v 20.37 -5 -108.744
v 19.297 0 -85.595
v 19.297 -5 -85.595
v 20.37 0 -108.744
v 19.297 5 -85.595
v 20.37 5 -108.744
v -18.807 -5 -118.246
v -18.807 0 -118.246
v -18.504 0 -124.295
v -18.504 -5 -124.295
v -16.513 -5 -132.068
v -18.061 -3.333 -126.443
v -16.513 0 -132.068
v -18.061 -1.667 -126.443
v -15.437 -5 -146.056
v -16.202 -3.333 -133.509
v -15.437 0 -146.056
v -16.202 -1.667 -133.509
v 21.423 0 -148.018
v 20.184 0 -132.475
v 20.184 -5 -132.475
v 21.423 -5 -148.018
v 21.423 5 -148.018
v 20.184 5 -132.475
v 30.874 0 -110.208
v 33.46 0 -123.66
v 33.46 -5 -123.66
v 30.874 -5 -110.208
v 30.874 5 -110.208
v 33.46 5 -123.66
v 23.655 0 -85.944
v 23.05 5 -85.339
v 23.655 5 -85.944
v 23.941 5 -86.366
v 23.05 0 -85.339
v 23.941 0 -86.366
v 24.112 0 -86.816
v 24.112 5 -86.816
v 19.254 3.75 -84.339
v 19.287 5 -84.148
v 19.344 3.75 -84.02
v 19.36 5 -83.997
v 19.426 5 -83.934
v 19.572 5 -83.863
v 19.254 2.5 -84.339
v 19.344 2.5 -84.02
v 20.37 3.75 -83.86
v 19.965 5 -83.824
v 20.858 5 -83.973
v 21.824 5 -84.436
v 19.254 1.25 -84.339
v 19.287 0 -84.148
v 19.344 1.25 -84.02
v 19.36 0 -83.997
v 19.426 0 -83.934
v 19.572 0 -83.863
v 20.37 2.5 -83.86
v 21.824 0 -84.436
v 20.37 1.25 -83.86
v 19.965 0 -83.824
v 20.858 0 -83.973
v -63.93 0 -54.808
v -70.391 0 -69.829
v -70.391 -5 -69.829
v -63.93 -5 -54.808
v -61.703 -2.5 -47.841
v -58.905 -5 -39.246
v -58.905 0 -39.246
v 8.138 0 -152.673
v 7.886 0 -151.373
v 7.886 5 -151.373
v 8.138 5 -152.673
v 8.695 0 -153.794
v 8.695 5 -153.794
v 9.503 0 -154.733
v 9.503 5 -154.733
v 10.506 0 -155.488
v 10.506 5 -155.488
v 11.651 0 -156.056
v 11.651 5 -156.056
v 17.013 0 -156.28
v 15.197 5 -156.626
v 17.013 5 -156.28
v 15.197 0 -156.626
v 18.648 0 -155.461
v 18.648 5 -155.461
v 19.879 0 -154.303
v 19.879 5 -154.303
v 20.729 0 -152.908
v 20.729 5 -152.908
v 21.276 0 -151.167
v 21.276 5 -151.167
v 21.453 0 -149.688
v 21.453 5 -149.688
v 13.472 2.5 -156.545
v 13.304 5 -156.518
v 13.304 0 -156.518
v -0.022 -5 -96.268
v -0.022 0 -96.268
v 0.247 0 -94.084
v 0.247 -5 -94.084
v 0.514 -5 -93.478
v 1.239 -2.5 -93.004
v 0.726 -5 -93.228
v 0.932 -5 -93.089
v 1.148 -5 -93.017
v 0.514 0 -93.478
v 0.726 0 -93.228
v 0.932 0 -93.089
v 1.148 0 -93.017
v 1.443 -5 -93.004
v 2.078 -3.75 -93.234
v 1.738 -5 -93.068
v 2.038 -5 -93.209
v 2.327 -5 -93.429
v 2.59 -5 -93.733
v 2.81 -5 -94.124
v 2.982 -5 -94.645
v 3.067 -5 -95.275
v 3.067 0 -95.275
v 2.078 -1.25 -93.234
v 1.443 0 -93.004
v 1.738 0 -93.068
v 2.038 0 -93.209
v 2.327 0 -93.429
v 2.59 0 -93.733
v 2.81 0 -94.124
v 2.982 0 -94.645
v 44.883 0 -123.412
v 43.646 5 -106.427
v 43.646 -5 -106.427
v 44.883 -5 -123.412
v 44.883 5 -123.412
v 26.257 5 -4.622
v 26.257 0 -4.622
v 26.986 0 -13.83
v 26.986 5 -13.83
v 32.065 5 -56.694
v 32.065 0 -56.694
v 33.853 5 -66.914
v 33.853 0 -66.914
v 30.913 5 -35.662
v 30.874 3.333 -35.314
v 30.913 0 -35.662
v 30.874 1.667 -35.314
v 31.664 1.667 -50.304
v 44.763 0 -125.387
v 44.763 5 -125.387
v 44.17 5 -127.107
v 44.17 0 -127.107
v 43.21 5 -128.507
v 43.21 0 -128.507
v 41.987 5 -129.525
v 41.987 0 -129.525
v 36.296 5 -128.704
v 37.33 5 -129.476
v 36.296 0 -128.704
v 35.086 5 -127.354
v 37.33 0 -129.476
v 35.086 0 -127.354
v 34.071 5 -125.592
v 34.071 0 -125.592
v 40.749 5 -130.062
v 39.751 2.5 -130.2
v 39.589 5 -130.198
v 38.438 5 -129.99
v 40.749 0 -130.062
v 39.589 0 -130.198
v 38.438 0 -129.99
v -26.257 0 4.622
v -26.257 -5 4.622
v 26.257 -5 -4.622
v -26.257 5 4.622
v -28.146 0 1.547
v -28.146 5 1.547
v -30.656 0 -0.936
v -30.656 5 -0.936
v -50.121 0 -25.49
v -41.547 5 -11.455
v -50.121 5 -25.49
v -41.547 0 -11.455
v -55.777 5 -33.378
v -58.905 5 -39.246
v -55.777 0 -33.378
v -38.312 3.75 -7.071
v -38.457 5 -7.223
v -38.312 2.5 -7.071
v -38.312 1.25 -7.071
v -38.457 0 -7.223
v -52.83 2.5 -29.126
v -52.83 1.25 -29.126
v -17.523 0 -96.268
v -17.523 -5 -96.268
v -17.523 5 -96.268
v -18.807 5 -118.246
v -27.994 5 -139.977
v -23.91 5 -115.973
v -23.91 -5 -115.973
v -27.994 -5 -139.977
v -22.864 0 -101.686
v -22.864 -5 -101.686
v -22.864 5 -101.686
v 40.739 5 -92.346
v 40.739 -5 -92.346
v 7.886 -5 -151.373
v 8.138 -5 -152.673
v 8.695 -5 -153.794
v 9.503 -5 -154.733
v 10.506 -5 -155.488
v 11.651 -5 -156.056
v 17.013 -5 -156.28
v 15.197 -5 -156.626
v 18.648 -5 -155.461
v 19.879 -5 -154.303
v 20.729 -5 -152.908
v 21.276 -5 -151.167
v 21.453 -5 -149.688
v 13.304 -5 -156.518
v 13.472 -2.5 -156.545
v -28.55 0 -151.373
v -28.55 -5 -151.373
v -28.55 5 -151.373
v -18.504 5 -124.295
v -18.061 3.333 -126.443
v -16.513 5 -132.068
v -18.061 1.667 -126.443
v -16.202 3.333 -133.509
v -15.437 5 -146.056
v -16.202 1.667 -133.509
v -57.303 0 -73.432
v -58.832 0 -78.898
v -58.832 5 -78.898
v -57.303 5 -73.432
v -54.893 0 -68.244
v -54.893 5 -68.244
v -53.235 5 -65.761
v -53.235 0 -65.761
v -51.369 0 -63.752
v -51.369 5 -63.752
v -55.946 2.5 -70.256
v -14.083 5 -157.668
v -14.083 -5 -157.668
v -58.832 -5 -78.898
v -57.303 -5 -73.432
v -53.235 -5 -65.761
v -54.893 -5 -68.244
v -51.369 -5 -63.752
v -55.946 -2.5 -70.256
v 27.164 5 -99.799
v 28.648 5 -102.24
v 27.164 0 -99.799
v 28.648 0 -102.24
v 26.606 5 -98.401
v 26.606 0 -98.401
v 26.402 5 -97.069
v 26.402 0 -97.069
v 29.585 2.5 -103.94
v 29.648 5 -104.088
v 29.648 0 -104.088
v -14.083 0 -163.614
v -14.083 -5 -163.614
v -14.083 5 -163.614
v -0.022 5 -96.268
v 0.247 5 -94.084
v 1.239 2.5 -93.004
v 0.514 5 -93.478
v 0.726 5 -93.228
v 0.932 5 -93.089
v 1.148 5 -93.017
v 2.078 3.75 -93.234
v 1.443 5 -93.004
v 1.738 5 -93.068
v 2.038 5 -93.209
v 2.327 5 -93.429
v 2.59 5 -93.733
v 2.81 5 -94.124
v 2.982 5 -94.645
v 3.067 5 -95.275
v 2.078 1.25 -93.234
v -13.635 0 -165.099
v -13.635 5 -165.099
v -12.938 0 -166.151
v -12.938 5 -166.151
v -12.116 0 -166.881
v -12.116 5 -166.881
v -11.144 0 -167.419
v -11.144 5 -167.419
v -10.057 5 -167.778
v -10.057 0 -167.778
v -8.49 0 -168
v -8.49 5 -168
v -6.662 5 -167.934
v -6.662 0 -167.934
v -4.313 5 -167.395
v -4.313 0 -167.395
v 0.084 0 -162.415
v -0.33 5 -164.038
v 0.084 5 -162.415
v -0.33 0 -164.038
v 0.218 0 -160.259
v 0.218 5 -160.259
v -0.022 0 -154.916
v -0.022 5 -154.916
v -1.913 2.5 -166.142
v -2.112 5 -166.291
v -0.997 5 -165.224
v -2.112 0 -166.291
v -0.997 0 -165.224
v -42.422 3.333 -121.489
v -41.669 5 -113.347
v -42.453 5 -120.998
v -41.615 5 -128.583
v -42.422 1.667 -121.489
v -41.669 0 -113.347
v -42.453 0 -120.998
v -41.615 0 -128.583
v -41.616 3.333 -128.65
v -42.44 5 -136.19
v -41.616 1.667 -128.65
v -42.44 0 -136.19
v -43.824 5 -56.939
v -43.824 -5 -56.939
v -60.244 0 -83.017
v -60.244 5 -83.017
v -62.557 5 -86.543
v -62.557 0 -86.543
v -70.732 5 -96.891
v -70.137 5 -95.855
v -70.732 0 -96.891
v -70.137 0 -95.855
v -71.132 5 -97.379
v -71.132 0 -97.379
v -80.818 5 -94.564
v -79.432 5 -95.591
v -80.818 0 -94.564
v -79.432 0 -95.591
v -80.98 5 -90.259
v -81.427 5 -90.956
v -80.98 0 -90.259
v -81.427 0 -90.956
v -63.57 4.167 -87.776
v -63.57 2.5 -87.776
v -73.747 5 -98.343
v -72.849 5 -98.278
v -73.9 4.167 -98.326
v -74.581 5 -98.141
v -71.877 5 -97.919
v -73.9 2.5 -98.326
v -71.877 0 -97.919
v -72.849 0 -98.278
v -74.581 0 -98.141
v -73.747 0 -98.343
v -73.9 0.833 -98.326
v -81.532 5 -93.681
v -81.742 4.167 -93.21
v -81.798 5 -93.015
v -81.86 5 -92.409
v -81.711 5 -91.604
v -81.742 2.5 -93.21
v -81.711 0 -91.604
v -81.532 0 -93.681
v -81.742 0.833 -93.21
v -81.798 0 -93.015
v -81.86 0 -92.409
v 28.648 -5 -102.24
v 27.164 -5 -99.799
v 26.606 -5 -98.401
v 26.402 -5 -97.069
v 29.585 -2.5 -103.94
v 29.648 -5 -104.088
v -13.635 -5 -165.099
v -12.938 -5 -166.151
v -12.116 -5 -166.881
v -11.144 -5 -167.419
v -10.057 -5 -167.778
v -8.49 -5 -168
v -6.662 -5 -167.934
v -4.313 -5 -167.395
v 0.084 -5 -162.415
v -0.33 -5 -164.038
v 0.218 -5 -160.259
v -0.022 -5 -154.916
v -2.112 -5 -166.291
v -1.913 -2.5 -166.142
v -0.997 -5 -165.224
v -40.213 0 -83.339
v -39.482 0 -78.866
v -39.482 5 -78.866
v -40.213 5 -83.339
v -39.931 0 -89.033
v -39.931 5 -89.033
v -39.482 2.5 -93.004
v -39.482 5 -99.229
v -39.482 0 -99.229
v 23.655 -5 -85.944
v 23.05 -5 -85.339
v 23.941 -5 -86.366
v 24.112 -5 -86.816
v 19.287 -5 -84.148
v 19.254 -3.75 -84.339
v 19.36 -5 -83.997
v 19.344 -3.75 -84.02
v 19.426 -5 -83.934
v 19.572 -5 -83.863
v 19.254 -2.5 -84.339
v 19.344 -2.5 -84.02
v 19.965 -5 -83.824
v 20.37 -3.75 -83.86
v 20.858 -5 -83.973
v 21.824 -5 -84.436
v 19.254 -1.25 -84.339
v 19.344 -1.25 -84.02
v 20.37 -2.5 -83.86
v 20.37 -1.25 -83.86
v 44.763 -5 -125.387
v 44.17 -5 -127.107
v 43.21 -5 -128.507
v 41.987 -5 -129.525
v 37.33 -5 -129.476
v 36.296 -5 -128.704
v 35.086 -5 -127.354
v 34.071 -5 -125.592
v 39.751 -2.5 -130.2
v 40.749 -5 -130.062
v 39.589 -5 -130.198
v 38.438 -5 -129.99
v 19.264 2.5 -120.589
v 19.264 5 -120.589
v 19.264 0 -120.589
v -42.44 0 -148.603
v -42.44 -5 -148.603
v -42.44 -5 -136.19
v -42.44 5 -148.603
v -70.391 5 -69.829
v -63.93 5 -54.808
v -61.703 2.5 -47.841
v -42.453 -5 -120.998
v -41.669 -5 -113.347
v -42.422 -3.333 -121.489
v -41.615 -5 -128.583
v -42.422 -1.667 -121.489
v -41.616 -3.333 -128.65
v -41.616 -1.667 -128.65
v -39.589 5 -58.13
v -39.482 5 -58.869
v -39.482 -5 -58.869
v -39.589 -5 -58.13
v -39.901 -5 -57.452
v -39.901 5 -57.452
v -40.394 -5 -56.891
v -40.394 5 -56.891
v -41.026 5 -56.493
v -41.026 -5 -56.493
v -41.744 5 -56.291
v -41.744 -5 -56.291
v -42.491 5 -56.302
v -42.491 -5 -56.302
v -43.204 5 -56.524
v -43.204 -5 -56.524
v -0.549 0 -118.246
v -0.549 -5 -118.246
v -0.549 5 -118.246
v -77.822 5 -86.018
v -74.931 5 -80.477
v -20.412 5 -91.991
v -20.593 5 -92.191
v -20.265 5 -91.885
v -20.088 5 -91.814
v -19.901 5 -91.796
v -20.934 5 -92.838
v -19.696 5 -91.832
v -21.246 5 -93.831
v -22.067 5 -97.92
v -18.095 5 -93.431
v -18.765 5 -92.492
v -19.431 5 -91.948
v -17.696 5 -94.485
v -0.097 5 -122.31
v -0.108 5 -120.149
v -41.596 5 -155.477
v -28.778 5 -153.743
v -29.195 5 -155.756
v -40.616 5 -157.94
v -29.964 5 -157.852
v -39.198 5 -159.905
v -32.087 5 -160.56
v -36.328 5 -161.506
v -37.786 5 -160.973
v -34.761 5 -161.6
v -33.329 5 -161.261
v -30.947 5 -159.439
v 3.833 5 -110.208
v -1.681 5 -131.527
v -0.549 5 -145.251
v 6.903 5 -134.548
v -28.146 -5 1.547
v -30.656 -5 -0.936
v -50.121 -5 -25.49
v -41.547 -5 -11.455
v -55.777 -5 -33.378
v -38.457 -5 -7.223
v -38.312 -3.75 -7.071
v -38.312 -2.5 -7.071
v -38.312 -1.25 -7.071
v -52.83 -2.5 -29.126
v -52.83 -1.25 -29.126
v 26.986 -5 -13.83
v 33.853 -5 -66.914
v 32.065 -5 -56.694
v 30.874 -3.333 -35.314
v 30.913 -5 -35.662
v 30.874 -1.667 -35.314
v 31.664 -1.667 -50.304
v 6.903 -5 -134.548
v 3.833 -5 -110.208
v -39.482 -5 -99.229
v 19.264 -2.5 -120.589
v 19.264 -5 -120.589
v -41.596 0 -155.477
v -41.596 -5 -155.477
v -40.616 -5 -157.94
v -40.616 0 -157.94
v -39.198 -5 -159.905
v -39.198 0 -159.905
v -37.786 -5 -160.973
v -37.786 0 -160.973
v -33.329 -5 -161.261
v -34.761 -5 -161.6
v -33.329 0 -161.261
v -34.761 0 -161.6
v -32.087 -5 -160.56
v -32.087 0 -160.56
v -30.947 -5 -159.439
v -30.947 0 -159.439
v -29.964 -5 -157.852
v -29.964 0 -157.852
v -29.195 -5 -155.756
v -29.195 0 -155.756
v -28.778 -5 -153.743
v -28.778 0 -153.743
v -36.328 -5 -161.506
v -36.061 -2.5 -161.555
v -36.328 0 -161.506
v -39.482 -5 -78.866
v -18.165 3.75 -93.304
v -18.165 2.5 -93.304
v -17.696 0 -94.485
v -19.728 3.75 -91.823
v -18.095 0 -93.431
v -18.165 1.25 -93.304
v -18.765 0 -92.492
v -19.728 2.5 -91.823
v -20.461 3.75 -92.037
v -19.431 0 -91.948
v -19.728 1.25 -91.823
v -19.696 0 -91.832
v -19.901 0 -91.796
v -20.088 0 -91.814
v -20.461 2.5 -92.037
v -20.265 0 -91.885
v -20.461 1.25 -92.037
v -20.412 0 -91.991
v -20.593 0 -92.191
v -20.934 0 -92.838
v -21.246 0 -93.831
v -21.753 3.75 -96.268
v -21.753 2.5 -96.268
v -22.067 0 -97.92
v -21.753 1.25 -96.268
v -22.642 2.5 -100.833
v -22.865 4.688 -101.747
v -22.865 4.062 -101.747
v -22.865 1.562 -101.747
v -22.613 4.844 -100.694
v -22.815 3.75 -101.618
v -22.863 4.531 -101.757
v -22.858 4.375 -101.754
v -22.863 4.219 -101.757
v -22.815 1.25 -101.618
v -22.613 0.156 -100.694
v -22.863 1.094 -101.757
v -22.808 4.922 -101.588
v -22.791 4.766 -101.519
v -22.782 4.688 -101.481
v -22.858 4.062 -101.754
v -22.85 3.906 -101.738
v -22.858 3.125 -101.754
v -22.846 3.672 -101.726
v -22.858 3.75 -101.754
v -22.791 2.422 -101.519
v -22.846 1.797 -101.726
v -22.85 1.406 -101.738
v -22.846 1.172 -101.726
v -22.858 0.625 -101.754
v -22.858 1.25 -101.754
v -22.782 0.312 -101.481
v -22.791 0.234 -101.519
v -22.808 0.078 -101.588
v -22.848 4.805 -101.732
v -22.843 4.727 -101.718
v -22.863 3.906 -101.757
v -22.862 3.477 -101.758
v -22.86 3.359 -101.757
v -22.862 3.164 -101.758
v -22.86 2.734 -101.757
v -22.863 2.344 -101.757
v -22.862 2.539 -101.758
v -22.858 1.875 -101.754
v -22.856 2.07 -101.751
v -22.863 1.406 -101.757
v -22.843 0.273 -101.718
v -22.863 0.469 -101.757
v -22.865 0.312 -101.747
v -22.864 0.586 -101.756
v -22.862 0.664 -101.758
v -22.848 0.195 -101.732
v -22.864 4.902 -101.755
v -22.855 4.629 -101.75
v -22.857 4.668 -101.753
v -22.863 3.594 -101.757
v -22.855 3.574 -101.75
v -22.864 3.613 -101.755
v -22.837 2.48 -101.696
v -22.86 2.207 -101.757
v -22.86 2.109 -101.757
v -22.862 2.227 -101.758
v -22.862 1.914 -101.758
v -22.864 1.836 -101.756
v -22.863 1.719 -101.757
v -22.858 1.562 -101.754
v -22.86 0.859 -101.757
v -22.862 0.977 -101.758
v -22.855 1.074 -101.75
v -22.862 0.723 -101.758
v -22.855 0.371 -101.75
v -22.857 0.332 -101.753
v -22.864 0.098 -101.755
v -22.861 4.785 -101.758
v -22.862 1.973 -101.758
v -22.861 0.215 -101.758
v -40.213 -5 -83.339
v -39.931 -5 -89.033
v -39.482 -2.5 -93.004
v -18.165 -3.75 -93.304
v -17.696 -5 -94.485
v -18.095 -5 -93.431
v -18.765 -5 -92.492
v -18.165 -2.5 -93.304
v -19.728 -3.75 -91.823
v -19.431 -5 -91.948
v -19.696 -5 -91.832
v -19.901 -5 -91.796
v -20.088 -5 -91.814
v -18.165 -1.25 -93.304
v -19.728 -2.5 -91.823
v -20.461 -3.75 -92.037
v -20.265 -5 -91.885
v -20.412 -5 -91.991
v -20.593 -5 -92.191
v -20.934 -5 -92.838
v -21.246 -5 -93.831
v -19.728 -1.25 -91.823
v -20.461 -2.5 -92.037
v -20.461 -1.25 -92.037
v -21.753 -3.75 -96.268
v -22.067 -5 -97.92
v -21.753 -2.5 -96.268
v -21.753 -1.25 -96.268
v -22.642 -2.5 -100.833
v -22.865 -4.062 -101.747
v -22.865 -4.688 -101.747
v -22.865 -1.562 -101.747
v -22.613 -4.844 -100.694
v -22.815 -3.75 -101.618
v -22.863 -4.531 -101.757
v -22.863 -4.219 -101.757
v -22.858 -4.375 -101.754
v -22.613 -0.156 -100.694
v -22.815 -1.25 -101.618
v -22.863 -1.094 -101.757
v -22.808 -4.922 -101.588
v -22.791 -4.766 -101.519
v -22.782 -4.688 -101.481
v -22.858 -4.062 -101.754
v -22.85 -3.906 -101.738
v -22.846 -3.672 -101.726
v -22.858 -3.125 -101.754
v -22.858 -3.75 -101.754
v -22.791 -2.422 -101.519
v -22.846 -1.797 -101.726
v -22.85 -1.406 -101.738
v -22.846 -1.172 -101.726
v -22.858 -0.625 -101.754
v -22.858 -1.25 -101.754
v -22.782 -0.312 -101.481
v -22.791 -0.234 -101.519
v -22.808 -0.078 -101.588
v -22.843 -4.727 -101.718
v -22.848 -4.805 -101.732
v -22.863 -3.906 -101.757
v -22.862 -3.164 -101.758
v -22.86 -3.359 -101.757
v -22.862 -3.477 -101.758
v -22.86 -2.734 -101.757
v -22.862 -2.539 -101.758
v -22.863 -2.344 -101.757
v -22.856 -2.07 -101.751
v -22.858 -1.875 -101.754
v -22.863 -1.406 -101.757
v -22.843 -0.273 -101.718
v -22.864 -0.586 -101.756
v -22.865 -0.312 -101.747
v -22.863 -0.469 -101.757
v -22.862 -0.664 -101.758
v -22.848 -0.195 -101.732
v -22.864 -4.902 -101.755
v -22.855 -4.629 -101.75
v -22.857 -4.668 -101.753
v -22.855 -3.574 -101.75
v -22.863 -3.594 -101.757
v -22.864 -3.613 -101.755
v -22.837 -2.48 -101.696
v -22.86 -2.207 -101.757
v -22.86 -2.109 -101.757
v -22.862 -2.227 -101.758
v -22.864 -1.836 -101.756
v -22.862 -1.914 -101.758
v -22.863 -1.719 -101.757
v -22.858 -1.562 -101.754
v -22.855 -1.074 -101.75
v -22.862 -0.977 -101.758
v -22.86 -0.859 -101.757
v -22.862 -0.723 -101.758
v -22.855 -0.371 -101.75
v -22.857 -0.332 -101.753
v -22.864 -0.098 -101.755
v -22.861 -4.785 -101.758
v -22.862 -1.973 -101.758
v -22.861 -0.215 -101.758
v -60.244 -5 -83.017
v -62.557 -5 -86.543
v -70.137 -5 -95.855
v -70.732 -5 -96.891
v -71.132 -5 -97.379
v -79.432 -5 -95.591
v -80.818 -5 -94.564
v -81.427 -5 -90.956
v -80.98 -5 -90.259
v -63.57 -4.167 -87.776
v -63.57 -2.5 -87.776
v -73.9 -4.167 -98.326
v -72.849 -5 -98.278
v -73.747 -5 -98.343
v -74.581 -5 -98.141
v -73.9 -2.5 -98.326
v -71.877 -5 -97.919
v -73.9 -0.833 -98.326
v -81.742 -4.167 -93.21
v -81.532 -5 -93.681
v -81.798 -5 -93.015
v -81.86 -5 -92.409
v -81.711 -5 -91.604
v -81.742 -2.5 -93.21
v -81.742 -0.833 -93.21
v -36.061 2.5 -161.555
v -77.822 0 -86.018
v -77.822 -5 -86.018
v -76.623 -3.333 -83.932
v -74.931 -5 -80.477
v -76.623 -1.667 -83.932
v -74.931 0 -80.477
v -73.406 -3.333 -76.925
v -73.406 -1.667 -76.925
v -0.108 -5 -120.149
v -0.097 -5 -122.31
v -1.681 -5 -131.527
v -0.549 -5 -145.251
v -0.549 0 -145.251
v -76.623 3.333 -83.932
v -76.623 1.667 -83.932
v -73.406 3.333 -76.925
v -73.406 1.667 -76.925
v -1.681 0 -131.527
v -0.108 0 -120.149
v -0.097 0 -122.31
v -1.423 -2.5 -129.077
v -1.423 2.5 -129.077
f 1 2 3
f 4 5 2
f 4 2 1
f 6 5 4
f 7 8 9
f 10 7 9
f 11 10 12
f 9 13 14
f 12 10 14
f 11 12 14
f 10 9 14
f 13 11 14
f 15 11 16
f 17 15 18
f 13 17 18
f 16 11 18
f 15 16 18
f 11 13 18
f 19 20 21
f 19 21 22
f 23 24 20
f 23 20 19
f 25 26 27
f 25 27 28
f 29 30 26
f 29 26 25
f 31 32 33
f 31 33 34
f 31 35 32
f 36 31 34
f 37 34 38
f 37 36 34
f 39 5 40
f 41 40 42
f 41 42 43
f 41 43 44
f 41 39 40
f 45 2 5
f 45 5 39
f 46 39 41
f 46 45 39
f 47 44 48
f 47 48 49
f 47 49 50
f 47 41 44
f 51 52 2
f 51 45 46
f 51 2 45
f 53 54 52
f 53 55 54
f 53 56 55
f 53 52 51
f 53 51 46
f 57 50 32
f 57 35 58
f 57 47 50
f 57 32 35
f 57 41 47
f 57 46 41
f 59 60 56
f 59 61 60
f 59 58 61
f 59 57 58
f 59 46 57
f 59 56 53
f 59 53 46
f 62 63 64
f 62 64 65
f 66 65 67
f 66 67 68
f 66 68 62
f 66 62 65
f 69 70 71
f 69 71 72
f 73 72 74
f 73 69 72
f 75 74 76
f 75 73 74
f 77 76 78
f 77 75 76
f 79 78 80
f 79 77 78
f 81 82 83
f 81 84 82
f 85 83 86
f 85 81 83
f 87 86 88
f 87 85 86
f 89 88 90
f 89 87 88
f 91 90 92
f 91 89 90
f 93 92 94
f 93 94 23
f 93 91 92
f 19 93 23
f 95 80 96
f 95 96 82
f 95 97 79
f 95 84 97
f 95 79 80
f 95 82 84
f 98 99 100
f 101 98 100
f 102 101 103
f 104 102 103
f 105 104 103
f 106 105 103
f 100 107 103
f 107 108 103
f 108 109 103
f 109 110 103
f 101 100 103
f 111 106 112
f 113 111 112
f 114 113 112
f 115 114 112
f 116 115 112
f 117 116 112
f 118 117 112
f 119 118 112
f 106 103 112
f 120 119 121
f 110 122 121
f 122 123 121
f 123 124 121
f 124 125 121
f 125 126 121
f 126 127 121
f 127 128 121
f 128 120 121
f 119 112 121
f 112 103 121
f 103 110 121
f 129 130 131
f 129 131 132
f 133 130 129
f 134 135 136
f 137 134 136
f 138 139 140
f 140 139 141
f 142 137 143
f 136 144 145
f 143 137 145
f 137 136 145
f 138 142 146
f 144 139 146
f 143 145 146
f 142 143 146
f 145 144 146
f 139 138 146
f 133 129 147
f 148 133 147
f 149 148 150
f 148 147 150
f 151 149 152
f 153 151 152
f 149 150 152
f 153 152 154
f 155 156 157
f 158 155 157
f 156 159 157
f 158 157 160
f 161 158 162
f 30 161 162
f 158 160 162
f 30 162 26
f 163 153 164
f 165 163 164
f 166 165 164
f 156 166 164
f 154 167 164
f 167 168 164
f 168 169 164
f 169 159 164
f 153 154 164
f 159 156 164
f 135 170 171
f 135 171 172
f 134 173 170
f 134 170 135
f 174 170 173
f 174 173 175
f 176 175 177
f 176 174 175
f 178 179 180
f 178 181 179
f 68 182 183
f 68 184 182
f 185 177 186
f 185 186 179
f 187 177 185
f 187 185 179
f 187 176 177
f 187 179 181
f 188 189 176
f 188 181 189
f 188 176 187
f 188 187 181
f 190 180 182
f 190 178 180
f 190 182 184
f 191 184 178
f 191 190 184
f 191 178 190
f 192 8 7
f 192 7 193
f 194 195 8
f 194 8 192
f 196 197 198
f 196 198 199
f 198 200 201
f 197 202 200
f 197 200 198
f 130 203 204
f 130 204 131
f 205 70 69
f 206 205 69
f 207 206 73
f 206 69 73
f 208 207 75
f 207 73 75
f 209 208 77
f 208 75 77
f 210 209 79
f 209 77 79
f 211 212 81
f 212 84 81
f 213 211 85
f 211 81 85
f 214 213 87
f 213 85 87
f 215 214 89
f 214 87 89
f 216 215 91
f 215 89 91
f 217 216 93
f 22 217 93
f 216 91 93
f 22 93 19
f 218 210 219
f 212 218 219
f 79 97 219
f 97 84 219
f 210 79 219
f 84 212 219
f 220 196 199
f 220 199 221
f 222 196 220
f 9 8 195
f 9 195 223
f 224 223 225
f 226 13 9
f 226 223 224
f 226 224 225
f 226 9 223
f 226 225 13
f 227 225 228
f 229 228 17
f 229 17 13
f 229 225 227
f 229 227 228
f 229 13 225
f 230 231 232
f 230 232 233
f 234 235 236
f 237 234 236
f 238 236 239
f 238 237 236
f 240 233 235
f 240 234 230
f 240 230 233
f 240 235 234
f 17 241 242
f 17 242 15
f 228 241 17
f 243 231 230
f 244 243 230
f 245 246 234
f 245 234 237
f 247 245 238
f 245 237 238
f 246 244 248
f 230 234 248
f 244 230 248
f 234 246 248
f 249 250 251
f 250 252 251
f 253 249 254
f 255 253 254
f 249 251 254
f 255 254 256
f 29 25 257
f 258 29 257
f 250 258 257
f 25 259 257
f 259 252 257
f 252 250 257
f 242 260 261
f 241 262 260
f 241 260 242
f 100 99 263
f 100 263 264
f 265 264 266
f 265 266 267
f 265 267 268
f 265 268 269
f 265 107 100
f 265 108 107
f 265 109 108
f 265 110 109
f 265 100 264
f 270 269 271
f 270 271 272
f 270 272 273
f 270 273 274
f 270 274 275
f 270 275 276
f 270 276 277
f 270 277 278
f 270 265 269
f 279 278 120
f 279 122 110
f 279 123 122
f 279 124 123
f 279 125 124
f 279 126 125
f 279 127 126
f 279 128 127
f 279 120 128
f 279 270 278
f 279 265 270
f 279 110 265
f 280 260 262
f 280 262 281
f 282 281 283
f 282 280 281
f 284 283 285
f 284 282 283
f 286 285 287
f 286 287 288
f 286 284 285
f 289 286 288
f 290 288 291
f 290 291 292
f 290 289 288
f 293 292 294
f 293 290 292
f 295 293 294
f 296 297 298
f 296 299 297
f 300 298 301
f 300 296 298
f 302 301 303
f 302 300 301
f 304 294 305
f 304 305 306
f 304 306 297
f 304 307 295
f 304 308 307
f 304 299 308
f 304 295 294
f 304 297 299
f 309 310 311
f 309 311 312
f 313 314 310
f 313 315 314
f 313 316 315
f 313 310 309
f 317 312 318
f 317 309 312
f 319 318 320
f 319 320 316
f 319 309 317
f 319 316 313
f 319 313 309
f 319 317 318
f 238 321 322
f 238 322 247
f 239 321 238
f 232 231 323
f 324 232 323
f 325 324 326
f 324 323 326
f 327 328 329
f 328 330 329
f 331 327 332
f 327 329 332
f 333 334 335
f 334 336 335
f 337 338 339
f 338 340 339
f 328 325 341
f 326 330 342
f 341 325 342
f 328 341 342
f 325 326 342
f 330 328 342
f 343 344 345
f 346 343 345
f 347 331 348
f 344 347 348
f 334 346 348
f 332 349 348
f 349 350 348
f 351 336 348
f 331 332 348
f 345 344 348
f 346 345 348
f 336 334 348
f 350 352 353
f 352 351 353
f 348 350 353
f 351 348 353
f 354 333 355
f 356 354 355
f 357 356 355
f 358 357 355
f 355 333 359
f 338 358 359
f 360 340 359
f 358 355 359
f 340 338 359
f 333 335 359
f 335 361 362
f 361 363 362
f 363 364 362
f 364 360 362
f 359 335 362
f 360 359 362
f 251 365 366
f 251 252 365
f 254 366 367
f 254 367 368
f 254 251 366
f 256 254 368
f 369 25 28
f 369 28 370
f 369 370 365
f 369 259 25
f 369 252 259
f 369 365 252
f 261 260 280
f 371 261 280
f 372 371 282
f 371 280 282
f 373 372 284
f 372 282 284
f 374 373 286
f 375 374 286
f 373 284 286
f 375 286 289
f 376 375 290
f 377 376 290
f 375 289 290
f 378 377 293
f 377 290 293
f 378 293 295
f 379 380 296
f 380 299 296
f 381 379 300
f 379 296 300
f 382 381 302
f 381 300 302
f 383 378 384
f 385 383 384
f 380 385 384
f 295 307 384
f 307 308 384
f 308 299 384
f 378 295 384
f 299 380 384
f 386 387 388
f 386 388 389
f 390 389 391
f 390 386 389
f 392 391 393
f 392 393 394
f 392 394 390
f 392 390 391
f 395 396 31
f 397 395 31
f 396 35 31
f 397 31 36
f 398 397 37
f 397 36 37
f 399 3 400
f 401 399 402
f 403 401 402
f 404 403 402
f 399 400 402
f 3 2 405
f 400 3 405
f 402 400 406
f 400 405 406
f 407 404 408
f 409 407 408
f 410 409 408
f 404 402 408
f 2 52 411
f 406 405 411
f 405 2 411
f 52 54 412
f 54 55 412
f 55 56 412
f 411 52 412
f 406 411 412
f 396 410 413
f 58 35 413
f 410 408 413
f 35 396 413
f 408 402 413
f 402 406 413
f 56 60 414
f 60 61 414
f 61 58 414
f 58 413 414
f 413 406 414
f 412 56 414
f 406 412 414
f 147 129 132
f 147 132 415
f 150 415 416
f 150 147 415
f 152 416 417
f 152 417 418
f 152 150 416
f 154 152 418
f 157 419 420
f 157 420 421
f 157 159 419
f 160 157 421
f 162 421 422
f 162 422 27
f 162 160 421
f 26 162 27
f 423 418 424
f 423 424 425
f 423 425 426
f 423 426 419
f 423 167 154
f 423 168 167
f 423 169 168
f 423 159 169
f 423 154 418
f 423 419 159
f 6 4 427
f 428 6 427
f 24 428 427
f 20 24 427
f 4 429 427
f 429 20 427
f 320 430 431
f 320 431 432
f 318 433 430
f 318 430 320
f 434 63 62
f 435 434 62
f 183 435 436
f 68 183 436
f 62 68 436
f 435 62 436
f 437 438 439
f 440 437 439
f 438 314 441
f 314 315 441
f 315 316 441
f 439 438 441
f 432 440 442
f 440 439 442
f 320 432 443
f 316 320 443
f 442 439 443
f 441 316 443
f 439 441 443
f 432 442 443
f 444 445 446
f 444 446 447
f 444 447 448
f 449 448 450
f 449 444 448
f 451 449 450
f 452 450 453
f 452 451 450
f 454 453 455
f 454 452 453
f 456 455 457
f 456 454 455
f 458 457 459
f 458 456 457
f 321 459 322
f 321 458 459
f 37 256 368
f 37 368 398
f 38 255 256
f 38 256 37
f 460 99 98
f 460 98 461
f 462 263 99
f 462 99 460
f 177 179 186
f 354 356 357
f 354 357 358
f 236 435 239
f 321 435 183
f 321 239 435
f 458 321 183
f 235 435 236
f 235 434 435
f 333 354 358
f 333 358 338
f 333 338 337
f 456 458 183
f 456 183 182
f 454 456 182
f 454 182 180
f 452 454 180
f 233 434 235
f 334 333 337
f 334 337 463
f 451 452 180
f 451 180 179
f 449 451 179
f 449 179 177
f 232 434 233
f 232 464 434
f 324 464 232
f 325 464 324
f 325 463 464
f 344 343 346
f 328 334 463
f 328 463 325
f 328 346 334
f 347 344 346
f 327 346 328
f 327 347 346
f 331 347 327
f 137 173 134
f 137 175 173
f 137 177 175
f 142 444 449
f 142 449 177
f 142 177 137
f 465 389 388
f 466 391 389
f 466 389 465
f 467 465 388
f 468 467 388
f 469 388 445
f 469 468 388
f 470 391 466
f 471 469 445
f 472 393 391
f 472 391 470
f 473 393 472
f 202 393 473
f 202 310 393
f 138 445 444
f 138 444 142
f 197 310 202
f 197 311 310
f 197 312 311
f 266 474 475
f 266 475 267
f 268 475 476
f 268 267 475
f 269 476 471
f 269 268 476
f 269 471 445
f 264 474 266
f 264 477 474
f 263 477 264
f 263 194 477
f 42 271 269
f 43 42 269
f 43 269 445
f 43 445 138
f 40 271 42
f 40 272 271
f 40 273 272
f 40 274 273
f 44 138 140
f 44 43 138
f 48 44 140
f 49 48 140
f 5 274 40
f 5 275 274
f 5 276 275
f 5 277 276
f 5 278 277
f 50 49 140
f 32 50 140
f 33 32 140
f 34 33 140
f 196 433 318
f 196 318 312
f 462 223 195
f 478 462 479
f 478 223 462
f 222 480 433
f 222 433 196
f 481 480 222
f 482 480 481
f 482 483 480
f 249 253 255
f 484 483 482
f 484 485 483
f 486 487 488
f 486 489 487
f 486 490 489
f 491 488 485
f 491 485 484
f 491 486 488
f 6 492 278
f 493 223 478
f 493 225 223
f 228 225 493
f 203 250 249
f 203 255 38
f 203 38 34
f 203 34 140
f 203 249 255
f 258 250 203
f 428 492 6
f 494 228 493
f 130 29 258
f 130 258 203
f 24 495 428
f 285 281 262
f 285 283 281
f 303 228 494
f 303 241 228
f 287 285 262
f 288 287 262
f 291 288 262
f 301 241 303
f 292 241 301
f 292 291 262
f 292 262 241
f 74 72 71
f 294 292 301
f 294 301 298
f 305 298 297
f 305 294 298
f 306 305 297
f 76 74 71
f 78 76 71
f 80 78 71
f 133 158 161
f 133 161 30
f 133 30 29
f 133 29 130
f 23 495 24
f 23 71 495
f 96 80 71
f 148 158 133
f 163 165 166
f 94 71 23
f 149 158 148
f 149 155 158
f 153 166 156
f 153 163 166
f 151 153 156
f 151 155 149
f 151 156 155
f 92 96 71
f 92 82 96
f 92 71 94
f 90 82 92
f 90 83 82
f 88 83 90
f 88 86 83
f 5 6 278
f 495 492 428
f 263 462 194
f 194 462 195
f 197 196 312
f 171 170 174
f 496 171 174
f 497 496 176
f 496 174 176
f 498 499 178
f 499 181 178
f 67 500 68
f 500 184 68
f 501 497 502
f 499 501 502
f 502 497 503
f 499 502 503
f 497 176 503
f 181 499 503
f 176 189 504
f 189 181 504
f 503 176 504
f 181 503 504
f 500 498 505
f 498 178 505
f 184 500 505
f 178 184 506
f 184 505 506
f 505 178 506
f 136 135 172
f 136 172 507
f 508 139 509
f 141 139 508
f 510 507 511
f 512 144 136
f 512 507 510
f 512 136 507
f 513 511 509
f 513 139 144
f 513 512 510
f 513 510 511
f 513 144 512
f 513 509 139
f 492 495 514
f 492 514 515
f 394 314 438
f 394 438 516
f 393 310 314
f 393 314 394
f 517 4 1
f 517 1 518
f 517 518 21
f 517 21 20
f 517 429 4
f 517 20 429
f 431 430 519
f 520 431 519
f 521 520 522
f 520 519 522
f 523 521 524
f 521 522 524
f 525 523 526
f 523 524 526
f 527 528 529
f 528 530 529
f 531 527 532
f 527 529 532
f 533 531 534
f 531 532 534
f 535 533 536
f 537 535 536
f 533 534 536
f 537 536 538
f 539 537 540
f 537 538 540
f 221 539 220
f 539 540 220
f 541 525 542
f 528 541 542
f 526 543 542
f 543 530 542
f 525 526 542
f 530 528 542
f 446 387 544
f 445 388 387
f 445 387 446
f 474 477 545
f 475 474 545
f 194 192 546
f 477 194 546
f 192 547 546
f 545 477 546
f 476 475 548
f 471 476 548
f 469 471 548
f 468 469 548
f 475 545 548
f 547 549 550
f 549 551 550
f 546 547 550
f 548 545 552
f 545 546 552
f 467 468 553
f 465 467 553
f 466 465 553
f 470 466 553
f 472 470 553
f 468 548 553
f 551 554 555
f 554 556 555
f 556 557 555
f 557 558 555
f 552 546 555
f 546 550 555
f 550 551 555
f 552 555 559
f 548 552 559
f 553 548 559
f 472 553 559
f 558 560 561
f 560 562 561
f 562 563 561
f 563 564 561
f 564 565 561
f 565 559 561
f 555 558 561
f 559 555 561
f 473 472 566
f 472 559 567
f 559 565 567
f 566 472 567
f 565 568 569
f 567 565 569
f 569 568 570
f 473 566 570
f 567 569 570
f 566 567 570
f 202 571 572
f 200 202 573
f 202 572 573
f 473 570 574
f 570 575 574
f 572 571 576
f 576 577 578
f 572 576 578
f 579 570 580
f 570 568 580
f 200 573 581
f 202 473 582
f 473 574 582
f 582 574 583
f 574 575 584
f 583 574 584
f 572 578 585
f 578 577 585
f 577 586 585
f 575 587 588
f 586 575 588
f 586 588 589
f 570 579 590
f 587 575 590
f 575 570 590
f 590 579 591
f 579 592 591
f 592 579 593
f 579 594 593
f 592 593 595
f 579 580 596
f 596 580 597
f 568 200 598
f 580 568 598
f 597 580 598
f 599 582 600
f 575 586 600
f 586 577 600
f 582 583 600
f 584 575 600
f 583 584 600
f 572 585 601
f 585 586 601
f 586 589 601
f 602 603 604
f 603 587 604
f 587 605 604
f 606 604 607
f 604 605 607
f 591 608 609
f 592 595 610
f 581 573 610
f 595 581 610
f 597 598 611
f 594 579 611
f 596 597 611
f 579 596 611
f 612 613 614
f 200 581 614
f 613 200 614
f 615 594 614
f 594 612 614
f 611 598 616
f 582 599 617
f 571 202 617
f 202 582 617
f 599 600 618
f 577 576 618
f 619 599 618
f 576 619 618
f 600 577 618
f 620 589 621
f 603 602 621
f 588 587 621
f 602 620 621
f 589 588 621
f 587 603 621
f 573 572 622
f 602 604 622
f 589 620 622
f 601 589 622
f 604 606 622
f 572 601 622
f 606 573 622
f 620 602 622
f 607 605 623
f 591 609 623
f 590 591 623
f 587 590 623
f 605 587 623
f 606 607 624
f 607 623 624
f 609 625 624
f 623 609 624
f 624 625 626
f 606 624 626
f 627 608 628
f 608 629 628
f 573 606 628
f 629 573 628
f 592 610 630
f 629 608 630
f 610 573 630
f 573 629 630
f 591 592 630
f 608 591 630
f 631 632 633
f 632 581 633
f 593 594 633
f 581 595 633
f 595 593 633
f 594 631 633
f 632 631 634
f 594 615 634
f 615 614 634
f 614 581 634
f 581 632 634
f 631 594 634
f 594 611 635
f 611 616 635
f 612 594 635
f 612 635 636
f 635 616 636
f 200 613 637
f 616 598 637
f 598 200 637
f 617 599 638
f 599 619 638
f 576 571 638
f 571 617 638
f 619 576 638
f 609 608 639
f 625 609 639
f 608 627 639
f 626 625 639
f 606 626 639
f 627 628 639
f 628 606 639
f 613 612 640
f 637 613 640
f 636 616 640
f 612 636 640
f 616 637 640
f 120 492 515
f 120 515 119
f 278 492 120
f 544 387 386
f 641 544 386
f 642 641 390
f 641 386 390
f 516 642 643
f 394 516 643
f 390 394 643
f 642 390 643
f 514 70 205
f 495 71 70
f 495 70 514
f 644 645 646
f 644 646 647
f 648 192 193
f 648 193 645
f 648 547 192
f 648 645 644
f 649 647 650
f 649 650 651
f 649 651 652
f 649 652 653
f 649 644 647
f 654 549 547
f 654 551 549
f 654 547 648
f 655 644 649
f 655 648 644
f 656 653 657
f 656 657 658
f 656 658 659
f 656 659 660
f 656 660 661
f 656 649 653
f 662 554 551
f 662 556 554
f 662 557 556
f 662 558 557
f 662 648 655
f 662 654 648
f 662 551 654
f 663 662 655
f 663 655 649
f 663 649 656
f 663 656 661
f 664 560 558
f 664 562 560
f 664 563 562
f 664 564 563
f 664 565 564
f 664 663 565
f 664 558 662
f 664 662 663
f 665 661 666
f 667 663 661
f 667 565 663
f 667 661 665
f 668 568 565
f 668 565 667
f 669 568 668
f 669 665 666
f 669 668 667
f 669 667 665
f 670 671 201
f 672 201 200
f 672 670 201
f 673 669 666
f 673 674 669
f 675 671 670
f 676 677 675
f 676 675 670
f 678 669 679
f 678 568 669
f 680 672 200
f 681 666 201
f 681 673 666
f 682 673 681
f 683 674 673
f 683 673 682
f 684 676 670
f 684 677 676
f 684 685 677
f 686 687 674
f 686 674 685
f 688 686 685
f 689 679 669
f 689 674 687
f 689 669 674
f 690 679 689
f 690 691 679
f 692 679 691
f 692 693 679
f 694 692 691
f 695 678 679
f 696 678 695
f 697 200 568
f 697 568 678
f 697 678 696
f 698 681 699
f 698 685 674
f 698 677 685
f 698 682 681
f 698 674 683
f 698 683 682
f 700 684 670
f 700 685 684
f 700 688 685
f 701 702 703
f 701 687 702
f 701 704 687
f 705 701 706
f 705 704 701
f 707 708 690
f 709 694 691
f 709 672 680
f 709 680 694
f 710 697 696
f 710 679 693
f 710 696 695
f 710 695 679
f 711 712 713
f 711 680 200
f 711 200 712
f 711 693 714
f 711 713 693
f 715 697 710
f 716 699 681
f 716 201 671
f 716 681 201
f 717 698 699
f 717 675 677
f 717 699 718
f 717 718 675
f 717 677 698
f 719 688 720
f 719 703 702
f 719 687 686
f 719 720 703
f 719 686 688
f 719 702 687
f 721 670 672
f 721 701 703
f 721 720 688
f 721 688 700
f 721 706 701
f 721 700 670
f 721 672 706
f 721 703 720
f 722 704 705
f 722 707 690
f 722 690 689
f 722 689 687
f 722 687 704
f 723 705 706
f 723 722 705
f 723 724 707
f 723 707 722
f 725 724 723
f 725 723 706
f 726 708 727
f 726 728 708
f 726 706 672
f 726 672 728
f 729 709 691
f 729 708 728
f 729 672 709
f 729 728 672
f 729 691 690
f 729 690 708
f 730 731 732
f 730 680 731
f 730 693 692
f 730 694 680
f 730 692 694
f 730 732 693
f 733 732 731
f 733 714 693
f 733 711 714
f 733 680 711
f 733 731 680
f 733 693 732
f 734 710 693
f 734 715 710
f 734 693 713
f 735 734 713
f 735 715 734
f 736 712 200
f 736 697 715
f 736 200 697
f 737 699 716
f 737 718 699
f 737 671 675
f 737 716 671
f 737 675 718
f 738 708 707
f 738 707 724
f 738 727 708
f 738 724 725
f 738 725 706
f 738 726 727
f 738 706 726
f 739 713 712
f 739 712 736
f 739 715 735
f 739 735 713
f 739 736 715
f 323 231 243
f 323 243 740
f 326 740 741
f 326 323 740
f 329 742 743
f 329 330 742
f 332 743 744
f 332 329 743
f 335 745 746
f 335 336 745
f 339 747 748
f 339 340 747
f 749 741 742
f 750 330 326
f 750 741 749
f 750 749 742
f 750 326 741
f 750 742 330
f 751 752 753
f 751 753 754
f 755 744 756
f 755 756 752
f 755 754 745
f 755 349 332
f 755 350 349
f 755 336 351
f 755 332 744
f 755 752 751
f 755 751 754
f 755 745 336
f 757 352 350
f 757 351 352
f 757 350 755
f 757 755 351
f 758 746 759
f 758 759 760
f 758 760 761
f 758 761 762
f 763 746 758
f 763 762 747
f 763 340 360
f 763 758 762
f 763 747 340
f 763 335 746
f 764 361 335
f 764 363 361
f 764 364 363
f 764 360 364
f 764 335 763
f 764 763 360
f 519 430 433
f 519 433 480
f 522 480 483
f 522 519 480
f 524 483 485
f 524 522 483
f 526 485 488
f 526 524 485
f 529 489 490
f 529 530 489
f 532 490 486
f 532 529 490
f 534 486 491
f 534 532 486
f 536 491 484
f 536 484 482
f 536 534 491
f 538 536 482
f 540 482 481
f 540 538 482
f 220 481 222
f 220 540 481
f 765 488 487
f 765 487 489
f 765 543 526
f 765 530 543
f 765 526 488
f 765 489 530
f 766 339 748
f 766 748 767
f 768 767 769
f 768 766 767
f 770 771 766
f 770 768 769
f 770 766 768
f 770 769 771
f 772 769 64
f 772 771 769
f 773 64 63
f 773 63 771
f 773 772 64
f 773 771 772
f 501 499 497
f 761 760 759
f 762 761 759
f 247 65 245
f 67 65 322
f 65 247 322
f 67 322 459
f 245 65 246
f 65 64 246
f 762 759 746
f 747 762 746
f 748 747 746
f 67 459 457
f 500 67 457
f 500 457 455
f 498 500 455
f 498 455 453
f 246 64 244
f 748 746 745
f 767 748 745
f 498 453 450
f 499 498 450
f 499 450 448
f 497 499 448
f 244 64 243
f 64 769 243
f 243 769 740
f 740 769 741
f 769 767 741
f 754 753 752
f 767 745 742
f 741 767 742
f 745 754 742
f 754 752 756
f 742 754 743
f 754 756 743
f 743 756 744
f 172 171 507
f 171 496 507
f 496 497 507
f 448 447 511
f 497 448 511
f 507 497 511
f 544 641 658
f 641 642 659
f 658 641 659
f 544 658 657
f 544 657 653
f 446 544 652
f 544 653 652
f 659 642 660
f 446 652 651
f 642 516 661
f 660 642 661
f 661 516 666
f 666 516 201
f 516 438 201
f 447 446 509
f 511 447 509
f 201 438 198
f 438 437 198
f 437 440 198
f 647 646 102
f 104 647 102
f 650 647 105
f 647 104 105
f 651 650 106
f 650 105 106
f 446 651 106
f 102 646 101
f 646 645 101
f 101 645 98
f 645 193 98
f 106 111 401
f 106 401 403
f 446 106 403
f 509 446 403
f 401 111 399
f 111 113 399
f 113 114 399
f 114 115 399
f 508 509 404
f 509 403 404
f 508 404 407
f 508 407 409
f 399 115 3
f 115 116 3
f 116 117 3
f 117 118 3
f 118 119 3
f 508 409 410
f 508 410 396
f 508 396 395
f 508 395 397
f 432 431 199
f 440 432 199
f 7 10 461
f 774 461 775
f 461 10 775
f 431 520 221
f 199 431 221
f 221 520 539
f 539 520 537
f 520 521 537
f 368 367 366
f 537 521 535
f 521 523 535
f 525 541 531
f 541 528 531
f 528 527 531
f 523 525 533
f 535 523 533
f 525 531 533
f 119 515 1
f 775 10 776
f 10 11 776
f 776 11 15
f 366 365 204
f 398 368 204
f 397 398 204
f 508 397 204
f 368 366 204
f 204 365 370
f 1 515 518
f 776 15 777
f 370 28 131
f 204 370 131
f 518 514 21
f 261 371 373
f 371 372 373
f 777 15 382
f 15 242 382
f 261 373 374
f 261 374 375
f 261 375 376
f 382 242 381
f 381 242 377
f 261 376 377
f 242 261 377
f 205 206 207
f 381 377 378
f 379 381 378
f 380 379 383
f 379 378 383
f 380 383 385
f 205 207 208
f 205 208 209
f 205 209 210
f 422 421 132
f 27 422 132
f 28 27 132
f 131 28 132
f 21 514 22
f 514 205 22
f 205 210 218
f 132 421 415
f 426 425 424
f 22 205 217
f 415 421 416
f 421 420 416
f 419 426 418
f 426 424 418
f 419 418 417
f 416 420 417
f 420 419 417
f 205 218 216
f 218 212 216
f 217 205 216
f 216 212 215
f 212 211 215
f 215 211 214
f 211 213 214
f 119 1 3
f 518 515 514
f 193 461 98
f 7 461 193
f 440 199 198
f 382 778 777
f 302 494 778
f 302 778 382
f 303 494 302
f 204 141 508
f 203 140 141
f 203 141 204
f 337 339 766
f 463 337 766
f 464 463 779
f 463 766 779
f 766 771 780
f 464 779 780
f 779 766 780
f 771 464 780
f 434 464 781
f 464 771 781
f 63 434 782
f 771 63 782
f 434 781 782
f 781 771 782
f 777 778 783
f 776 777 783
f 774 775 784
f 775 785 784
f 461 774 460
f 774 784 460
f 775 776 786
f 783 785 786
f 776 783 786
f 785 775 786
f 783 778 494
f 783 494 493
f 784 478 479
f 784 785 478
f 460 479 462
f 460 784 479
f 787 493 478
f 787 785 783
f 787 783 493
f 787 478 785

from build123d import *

# Parameters (mm, degrees)
BOSS_EXTRUDE1_DEPTH = 5


with BuildPart() as part:
    # Sketch2 → Boss-Extrude1 (new, symmetric)
    with BuildSketch(Plane(origin=(0, 0, 0), x_dir=(1, 0, 0), z_dir=(0, 1, 0))):
        with BuildLine():
            Line((-26.256733318, -4.621811883), (26.256733318, 4.621811883))
            add(Edge.make_bspline(
                [(26.256733318, 4.621811883), (26.184213815, 15.085916031), (31.39165321, 29.814258677), (31.49706253, 51.001483219), (32.310967161, 61.220682563), (33.852524137, 66.913865214)],
                knots=[0, 0, 0, 0, 0.494424997, 0.733347689, 1, 1, 1, 1], degree=3))
            Line((33.852524137, 66.913865214), (40.738782221, 92.345766637))
            Line((40.738782221, 92.345766637), (43.646124542, 106.427209936))
            Line((43.646124542, 106.427209936), (44.883071586, 123.411989276))
            add(Edge.make_bspline(
                [(44.883071586, 123.411989276), (45.165968858, 127.296511075), (39.51243958, 133.247924763), (34.10170013, 127.000274405), (33.459732834, 123.660322727)],
                knots=[0, 0, 0, 0, 0.483944054, 1, 1, 1, 1], degree=3))
            Line((33.459732834, 123.660322727), (30.874052834, 110.20785199))
            add(Edge.make_bspline(
                [(30.874052834, 110.20785199), (30.441188575, 107.955796914), (30.382492539, 103.306549634), (26.469197062, 99.749533646), (26.401505216, 97.069243348)],
                knots=[0, 0, 0, 0, 0.456305085, 1, 1, 1, 1], degree=3))
            Line((26.401505216, 97.069243348), (24.112480314, 86.815627265))
            add(Edge.make_bspline(
                [(19.297009656, 85.594758963), (19.243310028, 84.436078608), (19.094221788, 83.779551656), (20.94092685, 83.84883977), (22.432820011, 84.791228368), (23.934643349, 86.019012094), (24.112480314, 86.815627265)],
                knots=[0, 0, 0, 0, 0.237088594, 0.343164698, 0.637099032, 1, 1, 1, 1], degree=3))
            Line((19.297009656, 85.594758963), (20.36986935, 108.743922061))
            add(Edge.make_bspline(
                [(20.36986935, 108.743922061), (18.251278635, 120.569230524), (20.184141466, 132.474697955)],
                knots=[0, 0, 0, 1, 1, 1], degree=2))
            Line((20.184141466, 132.474697955), (21.422956498, 148.01825596))
            add(Edge.make_bspline(
                [(7.886453521, 151.373444104), (8.061393397, 154.365422898), (14.846563419, 158.831947186), (21.951965108, 154.65578924), (21.422956498, 148.01825596)],
                knots=[0, 0, 0, 0, 0.394994292, 1, 1, 1, 1], degree=3))
            Line((7.886453521, 151.373444104), (6.902699472, 134.548399342))
            Line((6.902699472, 134.548399342), (3.833351323, 110.20785199))
            Line((3.833351323, 110.20785199), (3.066920681, 95.274901286))
            add(Edge.make_bspline(
                [(-0.02159186, 96.268060872), (0.027684192, 94.213368932), (0.698982676, 92.143081029), (2.980886645, 93.598634774), (3.066920681, 95.274901286)],
                knots=[0, 0, 0, 0, 0.545550965, 1, 1, 1, 1], degree=3))
            Line((-0.02159186, 96.268060872), (-0.548678979, 118.246316572))
            add(Edge.make_bspline(
                [(-0.548678979, 145.251149648), (-0.915294678, 138.529010173), (-3.210810949, 131.270798089), (0.756296252, 121.816903372), (-0.548678979, 118.246316572)],
                knots=[0, 0, 0, 0, 0.597212586, 1, 1, 1, 1], degree=3))
            Line((-0.548678979, 145.251149648), (-0.02159186, 154.915637957))
            add(Edge.make_bspline(
                [(-14.082777353, 163.613875502), (-13.206305071, 169.295741696), (1.271215934, 168.230121804), (0.295217837, 160.724551686), (-0.02159186, 154.915637957)],
                knots=[0, 0, 0, 0, 0.553573038, 1, 1, 1, 1], degree=3))
            Line((-14.082777353, 163.613875502), (-14.082777353, 157.668307031))
            Line((-14.082777353, 157.668307031), (-15.437192564, 146.056382878))
            add(Edge.make_bspline(
                [(-18.807351222, 118.246316572), (-18.982381461, 121.2419879), (-18.455286153, 126.104488932), (-15.165218042, 135.219180874), (-15.95219543, 141.641064615), (-15.437192564, 146.056382878)],
                knots=[0, 0, 0, 0, 0.292833424, 0.552751335, 1, 1, 1, 1], degree=3))
            Line((-18.807351222, 118.246316572), (-17.5232119, 96.268060872))
            add(Edge.make_bspline(
                [(-17.5232119, 96.268060872), (-17.478594365, 95.504424428), (-17.663345633, 93.471140535), (-20.69353647, 90.530305698), (-21.741686411, 96.30347421), (-22.907109211, 102.276516742), (-22.86389916, 101.686280236)],
                knots=[0, 0, 0, 0, 0.194417097, 0.332418866, 0.645495928, 1, 1, 1, 1], degree=3))
            Line((-22.86389916, 101.686280236), (-23.90977525, 115.972638208))
            Line((-23.90977525, 115.972638208), (-27.993649806, 139.977396961))
            Line((-27.993649806, 139.977396961), (-28.550247244, 151.373444104))
            add(Edge.make_bspline(
                [(-42.440153209, 148.603290137), (-42.440153209, 156.79216036), (-37.316684629, 164.65280226), (-28.960959781, 159.782572709), (-28.550247244, 151.373444104)],
                knots=[0, 0, 0, 0, 0.53295506, 1, 1, 1, 1], degree=3))
            Line((-42.440153209, 148.603290137), (-42.440153209, 136.189708956))
            add(Edge.make_bspline(
                [(-41.668742375, 113.346816451), (-42.19497911, 116.743472309), (-42.99597028, 120.794670458), (-40.892054429, 129.161378833), (-42.440153209, 132.975454736), (-42.440153209, 136.189708956)],
                knots=[0, 0, 0, 0, 0.356023336, 0.669759724, 1, 1, 1, 1], degree=3))
            Line((-41.668742375, 113.346816451), (-39.481532119, 99.229214921))
            add(Edge.make_bspline(
                [(-39.481532119, 78.865982655), (-40.911565275, 83.601148767), (-39.535583433, 90.33311796), (-39.159502682, 97.150638681), (-39.481532119, 99.229214921)],
                knots=[0, 0, 0, 0, 0.695290511, 1, 1, 1, 1], degree=3))
            Line((-39.481532119, 78.865982655), (-39.481532119, 58.869061477))
            ThreePointArc((-39.481532119, 58.869061477), (-41.025725344, 56.493083351), (-43.824049084, 56.939389322))
            Line((-43.824049084, 56.939389322), (-51.36854474, 63.752158858))
            add(Edge.make_bspline(
                [(-58.832024896, 78.898041634), (-58.300951882, 75.958851634), (-56.370745123, 70.436918613), (-53.409290505, 65.594976618), (-51.36854474, 63.752158858)],
                knots=[0, 0, 0, 0, 0.533943101, 1, 1, 1, 1], degree=3))
            add(Edge.make_bspline(
                [(-58.832024896, 78.898041634), (-59.478052008, 82.473437818), (-63.45603922, 88.190679665), (-68.86425409, 93.338806019), (-71.187669739, 97.817450241), (-73.65768789, 98.799246852), (-78.090300121, 96.062640584), (-83.851775402, 94.152494508), (-80.98007287, 90.259003836)],
                knots=[0, 0, 0, 0, 0.267502676, 0.557706983, 0.582680153, 0.669254855, 0.724556218, 1, 1, 1, 1], degree=3))
            add(Edge.make_bspline(
                [(-80.98007287, 90.259003836), (-75.738710871, 84.470000229), (-73.6189357, 76.77203837), (-70.391217911, 69.829235803)],
                knots=[0, 0, 0, 0, 1, 1, 1, 1], degree=3))
            add(Edge.make_bspline(
                [(-70.391217911, 69.829235803), (-66.692008689, 62.860526967), (-62.867029651, 52.543349529), (-60.086598326, 42.060405741), (-58.905467069, 39.24574179)],
                knots=[0, 0, 0, 0, 0.723669094, 1, 1, 1, 1], degree=3))
            add(Edge.make_bspline(
                [(-26.256733318, -4.621811883), (-28.60669032, 0.892454726), (-39.270850453, 4.868841767), (-44.850488779, 18.875590893), (-52.803189433, 28.816690746), (-57.345558393, 35.528442216), (-58.905467069, 39.24574179)],
                knots=[0, 0, 0, 0, 0.306364848, 0.556646261, 0.785775409, 1, 1, 1, 1], degree=3))
        make_face()
    extrude(amount=BOSS_EXTRUDE1_DEPTH, both=True)


solid = part.part
